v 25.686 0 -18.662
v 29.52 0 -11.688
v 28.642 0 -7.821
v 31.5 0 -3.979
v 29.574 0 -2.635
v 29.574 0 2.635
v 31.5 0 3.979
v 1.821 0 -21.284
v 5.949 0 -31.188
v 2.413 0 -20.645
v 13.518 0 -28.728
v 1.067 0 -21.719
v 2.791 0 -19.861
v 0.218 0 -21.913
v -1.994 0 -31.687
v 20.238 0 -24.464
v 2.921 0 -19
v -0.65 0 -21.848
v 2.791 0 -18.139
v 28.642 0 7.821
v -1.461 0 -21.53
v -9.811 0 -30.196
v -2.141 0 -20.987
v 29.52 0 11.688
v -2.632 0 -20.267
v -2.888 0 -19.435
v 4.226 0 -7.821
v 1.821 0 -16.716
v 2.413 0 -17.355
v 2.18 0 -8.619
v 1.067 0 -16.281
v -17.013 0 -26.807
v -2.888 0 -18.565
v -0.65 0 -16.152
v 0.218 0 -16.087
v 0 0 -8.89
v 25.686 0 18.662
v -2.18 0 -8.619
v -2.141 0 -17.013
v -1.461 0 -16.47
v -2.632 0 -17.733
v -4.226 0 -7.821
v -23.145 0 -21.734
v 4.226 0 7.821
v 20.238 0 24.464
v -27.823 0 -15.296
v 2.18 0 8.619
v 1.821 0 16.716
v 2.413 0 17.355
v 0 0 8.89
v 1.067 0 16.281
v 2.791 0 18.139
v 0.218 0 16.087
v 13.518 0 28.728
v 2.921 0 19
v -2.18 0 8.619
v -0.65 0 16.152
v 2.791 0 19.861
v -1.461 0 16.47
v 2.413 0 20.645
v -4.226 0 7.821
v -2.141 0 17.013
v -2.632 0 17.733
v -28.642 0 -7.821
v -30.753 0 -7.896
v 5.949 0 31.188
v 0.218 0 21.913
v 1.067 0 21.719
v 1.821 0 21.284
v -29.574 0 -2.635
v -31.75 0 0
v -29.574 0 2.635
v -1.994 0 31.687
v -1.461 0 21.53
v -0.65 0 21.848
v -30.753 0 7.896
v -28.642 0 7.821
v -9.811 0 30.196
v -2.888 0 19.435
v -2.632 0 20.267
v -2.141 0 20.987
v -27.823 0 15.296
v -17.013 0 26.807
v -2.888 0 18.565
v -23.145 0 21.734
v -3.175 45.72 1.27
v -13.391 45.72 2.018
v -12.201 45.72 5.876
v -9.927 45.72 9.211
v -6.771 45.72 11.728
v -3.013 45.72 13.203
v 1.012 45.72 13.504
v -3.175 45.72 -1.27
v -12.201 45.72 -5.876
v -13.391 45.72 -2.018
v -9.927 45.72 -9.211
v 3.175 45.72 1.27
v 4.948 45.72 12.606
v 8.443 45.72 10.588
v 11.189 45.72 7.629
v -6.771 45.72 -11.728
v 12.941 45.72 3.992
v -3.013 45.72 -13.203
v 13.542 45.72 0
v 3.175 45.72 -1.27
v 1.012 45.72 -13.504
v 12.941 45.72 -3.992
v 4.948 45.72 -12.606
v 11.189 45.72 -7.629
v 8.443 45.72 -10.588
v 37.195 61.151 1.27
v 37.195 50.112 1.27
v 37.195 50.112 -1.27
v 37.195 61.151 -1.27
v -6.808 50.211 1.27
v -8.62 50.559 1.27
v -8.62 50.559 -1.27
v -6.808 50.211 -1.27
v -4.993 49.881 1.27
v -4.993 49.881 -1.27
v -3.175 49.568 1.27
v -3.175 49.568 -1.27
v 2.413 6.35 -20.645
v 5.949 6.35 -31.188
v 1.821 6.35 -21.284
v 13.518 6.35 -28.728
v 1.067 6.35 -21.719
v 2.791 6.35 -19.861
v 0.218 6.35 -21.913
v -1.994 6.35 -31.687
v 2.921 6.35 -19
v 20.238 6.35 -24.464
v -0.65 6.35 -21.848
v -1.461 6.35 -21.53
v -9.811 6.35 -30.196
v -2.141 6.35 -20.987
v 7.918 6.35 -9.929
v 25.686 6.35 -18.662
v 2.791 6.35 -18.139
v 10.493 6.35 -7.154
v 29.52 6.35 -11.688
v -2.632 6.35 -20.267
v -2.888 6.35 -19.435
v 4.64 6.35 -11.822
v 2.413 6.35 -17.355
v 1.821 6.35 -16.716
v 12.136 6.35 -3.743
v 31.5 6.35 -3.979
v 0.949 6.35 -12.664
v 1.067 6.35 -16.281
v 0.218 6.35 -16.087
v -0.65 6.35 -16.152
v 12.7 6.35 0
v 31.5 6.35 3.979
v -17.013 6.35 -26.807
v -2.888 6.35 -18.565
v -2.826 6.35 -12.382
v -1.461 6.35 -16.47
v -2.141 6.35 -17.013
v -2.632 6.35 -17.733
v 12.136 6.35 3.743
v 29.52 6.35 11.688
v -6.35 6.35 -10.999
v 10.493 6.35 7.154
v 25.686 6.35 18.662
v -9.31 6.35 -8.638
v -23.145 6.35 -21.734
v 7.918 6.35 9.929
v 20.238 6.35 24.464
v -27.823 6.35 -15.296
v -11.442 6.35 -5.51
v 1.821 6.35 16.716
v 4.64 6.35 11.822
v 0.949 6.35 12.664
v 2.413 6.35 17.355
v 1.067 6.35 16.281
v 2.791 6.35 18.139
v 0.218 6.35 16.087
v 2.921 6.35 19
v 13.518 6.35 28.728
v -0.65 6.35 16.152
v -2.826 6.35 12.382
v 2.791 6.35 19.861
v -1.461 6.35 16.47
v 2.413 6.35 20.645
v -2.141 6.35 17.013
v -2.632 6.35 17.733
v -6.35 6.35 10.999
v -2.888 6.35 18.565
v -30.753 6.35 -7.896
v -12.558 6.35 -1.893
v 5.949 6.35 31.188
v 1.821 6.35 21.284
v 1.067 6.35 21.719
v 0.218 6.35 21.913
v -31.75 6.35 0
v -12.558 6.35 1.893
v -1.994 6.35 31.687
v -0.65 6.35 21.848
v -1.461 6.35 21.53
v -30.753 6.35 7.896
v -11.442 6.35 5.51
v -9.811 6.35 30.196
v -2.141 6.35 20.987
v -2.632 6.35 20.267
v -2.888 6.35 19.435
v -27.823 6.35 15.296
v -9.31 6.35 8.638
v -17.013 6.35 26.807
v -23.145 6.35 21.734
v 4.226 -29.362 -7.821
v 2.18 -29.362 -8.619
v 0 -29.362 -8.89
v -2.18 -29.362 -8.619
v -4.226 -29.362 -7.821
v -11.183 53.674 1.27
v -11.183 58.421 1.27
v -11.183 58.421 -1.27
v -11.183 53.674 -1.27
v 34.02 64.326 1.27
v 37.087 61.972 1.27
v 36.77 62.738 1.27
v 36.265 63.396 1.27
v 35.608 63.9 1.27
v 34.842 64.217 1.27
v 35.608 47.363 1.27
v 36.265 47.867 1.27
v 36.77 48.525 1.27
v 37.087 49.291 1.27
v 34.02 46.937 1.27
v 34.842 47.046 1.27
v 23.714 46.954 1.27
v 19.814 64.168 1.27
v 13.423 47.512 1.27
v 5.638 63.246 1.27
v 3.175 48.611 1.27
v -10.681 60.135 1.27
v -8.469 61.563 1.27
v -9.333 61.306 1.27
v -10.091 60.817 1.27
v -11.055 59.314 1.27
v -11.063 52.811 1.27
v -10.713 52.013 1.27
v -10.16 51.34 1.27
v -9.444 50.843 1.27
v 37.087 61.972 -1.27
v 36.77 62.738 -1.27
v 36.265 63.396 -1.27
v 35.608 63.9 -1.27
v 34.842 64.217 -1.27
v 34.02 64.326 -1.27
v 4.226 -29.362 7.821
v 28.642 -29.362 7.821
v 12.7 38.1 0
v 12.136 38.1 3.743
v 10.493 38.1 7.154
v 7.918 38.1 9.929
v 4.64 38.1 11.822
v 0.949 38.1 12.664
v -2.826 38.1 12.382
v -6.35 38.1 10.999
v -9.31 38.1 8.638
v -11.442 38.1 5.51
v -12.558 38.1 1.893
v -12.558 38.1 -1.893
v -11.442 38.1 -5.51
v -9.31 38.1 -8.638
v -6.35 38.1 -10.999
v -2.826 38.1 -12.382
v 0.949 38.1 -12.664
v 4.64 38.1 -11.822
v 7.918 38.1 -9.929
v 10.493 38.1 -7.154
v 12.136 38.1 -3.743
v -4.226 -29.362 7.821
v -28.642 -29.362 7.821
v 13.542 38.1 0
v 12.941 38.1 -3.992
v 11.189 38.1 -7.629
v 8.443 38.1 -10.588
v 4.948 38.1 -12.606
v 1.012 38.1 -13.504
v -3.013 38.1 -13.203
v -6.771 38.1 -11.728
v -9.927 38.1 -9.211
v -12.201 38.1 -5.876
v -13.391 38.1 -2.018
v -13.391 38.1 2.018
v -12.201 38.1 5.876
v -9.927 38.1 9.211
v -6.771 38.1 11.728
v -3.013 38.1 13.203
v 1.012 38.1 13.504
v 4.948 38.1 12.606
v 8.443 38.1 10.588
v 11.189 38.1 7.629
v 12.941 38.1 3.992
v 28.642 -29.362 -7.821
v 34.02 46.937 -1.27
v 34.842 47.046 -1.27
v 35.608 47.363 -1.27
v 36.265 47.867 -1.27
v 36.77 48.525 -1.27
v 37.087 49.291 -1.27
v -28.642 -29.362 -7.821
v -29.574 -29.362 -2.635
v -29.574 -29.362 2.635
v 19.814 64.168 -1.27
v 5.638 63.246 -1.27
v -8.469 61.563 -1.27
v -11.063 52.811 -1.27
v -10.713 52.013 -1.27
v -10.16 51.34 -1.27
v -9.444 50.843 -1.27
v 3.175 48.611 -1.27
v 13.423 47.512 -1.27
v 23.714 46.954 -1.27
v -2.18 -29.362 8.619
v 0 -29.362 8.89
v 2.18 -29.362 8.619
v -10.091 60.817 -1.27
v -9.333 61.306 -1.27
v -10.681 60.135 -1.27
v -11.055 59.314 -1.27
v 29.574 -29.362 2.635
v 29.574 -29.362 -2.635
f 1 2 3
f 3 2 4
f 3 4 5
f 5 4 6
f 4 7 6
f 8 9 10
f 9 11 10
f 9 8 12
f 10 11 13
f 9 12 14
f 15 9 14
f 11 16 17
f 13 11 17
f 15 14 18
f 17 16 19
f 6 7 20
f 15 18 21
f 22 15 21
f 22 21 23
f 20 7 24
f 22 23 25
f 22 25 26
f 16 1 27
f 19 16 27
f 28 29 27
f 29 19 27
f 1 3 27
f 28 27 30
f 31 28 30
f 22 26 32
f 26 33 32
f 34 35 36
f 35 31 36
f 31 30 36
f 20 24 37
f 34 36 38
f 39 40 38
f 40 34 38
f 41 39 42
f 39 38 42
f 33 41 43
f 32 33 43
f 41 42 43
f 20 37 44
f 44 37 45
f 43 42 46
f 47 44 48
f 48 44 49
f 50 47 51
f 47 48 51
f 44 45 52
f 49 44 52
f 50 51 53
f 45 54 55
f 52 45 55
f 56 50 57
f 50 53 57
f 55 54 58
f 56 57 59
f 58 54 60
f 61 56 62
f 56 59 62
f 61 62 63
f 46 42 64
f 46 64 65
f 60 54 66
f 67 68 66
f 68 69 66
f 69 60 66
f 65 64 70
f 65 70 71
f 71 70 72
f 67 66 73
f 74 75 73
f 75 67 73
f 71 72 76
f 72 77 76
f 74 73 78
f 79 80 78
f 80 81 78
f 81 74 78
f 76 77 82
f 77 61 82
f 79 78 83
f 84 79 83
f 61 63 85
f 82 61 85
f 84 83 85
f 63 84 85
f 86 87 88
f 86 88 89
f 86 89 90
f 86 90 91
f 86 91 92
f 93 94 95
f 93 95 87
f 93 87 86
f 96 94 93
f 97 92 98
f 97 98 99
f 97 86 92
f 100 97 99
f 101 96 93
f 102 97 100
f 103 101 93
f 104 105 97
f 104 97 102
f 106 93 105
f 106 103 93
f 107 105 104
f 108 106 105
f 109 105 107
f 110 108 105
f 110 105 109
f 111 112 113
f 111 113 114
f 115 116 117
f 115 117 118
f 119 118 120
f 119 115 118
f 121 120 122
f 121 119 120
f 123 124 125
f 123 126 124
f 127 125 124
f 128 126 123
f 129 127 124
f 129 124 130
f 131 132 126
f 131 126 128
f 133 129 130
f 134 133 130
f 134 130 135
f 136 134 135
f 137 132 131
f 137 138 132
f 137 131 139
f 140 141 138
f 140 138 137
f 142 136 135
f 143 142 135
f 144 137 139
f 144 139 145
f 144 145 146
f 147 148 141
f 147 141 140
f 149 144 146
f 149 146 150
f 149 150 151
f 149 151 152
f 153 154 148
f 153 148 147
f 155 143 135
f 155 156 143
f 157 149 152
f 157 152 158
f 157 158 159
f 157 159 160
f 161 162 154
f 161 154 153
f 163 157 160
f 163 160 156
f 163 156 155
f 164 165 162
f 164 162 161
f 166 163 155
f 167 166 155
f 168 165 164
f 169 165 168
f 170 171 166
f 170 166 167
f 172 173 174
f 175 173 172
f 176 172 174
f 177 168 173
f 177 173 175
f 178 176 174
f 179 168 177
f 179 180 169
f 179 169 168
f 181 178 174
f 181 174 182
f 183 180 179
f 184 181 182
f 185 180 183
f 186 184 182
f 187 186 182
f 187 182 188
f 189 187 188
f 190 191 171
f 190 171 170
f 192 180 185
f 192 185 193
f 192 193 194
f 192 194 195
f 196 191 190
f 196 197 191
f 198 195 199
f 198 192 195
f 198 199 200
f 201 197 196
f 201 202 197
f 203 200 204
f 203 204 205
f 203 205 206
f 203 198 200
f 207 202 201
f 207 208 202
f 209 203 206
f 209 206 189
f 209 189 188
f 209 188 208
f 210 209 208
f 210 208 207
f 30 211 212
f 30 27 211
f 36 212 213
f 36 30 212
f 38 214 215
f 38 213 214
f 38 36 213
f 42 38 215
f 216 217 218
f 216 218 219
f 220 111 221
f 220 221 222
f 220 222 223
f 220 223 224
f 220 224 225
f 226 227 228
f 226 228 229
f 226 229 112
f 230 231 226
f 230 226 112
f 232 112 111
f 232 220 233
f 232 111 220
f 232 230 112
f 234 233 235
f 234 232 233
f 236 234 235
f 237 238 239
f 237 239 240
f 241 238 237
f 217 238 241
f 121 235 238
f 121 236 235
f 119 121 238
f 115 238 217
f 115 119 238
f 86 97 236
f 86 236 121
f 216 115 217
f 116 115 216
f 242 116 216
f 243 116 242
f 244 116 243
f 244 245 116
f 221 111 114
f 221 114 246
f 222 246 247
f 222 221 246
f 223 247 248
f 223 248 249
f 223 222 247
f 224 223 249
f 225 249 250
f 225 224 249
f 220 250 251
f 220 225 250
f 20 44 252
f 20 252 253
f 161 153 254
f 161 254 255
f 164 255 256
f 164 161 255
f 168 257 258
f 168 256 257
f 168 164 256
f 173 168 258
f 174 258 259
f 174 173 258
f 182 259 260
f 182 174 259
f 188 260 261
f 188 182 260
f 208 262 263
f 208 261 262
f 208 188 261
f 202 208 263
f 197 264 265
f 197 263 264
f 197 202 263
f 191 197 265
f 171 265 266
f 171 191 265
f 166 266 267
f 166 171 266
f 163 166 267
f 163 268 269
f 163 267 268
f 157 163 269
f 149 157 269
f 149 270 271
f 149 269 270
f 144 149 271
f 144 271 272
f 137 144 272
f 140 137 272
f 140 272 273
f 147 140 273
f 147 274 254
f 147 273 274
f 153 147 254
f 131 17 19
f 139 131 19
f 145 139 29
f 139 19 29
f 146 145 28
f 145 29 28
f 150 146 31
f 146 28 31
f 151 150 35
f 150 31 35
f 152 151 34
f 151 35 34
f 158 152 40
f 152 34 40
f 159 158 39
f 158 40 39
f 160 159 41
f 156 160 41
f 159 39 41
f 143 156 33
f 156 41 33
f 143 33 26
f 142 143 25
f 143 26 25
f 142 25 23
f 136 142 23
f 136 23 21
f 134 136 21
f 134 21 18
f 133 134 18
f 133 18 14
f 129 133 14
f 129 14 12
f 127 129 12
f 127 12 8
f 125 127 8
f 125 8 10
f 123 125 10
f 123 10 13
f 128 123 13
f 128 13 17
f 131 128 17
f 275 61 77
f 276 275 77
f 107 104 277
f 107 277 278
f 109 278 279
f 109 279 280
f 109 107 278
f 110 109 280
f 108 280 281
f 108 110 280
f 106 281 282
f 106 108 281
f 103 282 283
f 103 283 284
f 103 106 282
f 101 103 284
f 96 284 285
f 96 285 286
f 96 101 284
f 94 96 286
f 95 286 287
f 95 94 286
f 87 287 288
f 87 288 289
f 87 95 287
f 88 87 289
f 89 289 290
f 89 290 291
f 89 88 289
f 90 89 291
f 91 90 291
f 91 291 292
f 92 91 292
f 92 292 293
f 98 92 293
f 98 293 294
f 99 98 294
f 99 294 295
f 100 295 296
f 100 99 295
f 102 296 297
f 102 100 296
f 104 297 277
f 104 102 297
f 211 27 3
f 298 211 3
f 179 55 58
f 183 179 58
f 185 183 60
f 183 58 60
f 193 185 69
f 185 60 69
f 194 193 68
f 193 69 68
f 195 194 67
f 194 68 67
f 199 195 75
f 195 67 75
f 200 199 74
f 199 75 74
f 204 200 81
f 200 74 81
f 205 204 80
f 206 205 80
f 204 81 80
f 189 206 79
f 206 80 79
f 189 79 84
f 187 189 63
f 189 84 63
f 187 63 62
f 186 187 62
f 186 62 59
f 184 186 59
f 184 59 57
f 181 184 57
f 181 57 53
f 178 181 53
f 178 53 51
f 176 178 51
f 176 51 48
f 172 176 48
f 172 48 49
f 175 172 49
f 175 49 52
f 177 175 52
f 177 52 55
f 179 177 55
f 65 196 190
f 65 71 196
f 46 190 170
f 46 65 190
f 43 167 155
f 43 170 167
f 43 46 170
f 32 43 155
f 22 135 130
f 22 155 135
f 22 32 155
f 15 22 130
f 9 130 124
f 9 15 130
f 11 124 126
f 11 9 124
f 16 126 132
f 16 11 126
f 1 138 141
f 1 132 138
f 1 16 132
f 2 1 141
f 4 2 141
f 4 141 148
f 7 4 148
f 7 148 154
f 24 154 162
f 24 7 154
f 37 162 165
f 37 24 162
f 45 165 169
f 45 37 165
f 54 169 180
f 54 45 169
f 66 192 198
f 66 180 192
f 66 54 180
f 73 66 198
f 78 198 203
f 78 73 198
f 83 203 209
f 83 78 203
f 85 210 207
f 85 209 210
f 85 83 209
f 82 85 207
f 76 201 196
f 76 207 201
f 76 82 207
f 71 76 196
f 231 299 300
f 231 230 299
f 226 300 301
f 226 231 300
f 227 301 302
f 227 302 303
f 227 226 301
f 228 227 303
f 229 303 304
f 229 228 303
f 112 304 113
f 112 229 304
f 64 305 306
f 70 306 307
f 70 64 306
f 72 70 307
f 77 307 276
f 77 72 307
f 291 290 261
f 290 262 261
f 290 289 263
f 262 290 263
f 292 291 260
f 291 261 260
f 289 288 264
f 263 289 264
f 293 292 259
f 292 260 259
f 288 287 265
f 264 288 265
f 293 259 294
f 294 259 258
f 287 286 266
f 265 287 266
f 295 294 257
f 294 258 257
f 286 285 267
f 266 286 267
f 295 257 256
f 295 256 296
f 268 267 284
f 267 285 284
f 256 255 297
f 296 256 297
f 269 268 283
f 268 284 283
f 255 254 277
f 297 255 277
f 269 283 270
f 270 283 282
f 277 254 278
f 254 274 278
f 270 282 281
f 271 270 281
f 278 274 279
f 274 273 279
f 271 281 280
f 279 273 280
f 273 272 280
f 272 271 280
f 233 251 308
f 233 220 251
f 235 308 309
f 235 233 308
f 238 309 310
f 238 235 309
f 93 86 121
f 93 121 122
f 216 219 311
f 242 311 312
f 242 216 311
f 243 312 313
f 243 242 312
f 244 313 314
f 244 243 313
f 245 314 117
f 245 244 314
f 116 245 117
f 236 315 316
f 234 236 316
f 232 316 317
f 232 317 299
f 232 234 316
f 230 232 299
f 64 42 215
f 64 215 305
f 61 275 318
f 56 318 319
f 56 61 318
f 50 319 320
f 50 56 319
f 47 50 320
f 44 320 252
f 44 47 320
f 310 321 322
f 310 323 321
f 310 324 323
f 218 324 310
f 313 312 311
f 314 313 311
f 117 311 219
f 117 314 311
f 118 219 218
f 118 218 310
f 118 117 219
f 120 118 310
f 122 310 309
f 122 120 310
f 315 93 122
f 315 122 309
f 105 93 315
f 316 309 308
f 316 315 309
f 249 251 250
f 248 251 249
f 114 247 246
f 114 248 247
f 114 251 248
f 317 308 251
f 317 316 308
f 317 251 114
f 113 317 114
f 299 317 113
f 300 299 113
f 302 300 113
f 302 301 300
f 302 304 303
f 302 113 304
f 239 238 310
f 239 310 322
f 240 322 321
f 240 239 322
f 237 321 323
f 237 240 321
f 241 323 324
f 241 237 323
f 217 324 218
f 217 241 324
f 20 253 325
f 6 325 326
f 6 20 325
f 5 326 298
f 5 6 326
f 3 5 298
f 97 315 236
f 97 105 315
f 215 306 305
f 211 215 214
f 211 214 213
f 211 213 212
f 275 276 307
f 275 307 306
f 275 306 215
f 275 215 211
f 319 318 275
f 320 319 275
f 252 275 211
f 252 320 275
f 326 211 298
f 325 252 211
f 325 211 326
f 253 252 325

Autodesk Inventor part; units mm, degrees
ref_plane "YZ Plane" through (0, 0, 0) normal (1, 0, 0) x (0, 1, 0)
ref_plane "XZ Plane" through (0, 0, 0) normal (0, 1, 0) x (-1, 0, 0)
ref_plane "XY Plane" through (0, 0, 0) normal (0, 0, 1) x (1, 0, 0)
sketch "Sketch1" plane through (0, 0, 0) normal (0, 1, 0) x (-1, 0, 0)
  circle A0 centre (0, 0) radius 31.75
  dimension "d0" = 63.5
extrude "Extrusion1" add sketch "Sketch1" along normal blind 6.35
sketch "Sketch3" plane through (0, 6.35, 0) normal (0, 1, 0) x (1, 0, 0)
  circle A0 centre (0, 0) radius 12.7
  dimension "d9" = 25.4
extrude "Extrusion3" add sketch "Sketch3" along normal blind 31.75
sketch "Sketch4" plane through (0, 38.1, 0) normal (0, 1, 0) x (1, 0, 0)
  circle A0 centre (0, 0) radius 14.9177
extrude "Extrusion4" add sketch "Sketch4" along normal blind 7.62
sketch "Sketch5" plane through (0, 45.72, 0) normal (0, 1, 0) x (1, 0, 0)
  line L0 (-3.175, 1.27) -> (3.175, 1.27)
  line L1 (3.175, 1.27) -> (3.175, -1.27)
  line L2 (3.175, -1.27) -> (-3.175, -1.27)
  line L3 (-3.175, -1.27) -> (-3.175, 1.27)
  line L4 (-3.175, 1.27) -> (3.175, -1.27) construction
  line L5 (3.175, 1.27) -> (-3.175, -1.27) construction
  point P0 (0, 0)
  dimension "d14" = 6.35
  dimension "d15" = 2.54
extrude "Extrusion5" add sketch "Sketch5" along normal blind 2.54
sketch "Sketch6" plane through (-3.175, 45.72, 1.27) normal (0, 0, 1) x (1, 0, 0)
  line L0 (-8.0078, 1.2174) -> (37.195, 1.2174)
  line L1 (40.37, 4.3924) -> (40.37, 15.4306)
  line L2 (37.195, 18.6056) -> (-8.0078, 18.6056)
  line L3 (-8.0078, 12.7012) -> (-8.0078, 7.9542)
  arc A0 (37.195, 1.2174) -> (40.37, 4.3924) centre (37.195, 4.3924) ccw
  arc A1 (40.37, 15.4306) -> (37.195, 18.6056) centre (37.195, 15.4306) ccw
  arc A2 (-5.4455, 4.8388) -> (37.195, 1.2174) centre (32.3527, 197.046) ccw
  arc A3 (37.195, 18.6056) -> (-5.2937, 15.8426) centre (33.0266, -245.3603) ccw
  arc A4 (-8.0078, 7.9542) -> (-5.4455, 4.8388) centre (-4.8328, 7.9542) ccw
  arc A5 (-5.2937, 15.8426) -> (-8.0078, 12.7012) centre (-4.8328, 12.7012) ccw
  line L4 (0, 2.54) -> (0, 3.8476)
  line L5 (6.35, 2.54) -> (0, 2.54) projected
  line L6 (6.35, 2.54) -> (6.35, 2.891)
  arc A6 (0, 3.8476) -> (6.35, 2.891) centre (32.3527, 197.046) ccw
  point P0 (3.175, -45.72)
  point P1 (-8.0078, 5.3605)
  point P2 (-8.0078, 15.43)
  dimension "d18" = 3.175
  dimension "d19" = 3.175
extrude "Extrusion6" add sketch "Sketch6" against normal blind 2.54
sketch "Sketch7" plane through (0, 45.72, 0) normal (0, 1, 0) x (1, 0, 0)
  circle A0 centre (0, 0) radius 13.5422
  circle A1 centre (0, 0) radius 14.9177
extrude "Extrusion7" cut sketch "Sketch7" against normal blind 25.4
sketch "Sketch8" plane through (0, 0, 0) normal (0, -1, 0) x (1, 0, 0)
  circle A0 centre (0, 0) radius 29.6911
  circle A1 centre (0, 0) radius 8.89
  line L0 (-4.226, 7.8213) -> (-28.6424, 7.8213)
  line L1 (4.226, 7.8213) -> (28.6424, 7.8213)
  line L2 (4.226, -7.8213) -> (28.6424, -7.8213)
  line L3 (-4.226, -7.8213) -> (-28.6424, -7.8213)
  arc A2 (-28.6424, 7.8213) -> (-28.6424, -7.8213) centre (0, 0) ccw
  arc A3 (28.6424, -7.8213) -> (28.6424, 7.8213) centre (0, 0) ccw
  dimension "d24" = 17.78
extrude "Extrusion8" add sketch "Sketch8" along normal blind 29.3624 contours A0 L2 A1 L1 | L0 A1 L3 A0 | A1
sketch "Sketch10" plane through (0, 0, 0) normal (0, -1, 0) x (1, 0, 0)
  circle A0 centre (0, 0) radius 31.75 projected
  line L0 (0, -31.75) -> (0, -19)
  line L1 (0, -19) -> (0, 31.75)
  line L2 (0, 31.75) -> (0, 19)
  circle A1 centre (0, 19) radius 2.921
  circle A2 centre (0, -19) radius 2.921
  dimension "d31" = 12.75
  dimension "d32" = 12.75
  dimension "d33" = 5.842
extrude "Extrusion9" cut sketch "Sketch10" against normal blind 25.4 contours A1 L1 | L1 A1 | A2 L1 L0 | L0 L1 A2
properties part number "masterswitch"
